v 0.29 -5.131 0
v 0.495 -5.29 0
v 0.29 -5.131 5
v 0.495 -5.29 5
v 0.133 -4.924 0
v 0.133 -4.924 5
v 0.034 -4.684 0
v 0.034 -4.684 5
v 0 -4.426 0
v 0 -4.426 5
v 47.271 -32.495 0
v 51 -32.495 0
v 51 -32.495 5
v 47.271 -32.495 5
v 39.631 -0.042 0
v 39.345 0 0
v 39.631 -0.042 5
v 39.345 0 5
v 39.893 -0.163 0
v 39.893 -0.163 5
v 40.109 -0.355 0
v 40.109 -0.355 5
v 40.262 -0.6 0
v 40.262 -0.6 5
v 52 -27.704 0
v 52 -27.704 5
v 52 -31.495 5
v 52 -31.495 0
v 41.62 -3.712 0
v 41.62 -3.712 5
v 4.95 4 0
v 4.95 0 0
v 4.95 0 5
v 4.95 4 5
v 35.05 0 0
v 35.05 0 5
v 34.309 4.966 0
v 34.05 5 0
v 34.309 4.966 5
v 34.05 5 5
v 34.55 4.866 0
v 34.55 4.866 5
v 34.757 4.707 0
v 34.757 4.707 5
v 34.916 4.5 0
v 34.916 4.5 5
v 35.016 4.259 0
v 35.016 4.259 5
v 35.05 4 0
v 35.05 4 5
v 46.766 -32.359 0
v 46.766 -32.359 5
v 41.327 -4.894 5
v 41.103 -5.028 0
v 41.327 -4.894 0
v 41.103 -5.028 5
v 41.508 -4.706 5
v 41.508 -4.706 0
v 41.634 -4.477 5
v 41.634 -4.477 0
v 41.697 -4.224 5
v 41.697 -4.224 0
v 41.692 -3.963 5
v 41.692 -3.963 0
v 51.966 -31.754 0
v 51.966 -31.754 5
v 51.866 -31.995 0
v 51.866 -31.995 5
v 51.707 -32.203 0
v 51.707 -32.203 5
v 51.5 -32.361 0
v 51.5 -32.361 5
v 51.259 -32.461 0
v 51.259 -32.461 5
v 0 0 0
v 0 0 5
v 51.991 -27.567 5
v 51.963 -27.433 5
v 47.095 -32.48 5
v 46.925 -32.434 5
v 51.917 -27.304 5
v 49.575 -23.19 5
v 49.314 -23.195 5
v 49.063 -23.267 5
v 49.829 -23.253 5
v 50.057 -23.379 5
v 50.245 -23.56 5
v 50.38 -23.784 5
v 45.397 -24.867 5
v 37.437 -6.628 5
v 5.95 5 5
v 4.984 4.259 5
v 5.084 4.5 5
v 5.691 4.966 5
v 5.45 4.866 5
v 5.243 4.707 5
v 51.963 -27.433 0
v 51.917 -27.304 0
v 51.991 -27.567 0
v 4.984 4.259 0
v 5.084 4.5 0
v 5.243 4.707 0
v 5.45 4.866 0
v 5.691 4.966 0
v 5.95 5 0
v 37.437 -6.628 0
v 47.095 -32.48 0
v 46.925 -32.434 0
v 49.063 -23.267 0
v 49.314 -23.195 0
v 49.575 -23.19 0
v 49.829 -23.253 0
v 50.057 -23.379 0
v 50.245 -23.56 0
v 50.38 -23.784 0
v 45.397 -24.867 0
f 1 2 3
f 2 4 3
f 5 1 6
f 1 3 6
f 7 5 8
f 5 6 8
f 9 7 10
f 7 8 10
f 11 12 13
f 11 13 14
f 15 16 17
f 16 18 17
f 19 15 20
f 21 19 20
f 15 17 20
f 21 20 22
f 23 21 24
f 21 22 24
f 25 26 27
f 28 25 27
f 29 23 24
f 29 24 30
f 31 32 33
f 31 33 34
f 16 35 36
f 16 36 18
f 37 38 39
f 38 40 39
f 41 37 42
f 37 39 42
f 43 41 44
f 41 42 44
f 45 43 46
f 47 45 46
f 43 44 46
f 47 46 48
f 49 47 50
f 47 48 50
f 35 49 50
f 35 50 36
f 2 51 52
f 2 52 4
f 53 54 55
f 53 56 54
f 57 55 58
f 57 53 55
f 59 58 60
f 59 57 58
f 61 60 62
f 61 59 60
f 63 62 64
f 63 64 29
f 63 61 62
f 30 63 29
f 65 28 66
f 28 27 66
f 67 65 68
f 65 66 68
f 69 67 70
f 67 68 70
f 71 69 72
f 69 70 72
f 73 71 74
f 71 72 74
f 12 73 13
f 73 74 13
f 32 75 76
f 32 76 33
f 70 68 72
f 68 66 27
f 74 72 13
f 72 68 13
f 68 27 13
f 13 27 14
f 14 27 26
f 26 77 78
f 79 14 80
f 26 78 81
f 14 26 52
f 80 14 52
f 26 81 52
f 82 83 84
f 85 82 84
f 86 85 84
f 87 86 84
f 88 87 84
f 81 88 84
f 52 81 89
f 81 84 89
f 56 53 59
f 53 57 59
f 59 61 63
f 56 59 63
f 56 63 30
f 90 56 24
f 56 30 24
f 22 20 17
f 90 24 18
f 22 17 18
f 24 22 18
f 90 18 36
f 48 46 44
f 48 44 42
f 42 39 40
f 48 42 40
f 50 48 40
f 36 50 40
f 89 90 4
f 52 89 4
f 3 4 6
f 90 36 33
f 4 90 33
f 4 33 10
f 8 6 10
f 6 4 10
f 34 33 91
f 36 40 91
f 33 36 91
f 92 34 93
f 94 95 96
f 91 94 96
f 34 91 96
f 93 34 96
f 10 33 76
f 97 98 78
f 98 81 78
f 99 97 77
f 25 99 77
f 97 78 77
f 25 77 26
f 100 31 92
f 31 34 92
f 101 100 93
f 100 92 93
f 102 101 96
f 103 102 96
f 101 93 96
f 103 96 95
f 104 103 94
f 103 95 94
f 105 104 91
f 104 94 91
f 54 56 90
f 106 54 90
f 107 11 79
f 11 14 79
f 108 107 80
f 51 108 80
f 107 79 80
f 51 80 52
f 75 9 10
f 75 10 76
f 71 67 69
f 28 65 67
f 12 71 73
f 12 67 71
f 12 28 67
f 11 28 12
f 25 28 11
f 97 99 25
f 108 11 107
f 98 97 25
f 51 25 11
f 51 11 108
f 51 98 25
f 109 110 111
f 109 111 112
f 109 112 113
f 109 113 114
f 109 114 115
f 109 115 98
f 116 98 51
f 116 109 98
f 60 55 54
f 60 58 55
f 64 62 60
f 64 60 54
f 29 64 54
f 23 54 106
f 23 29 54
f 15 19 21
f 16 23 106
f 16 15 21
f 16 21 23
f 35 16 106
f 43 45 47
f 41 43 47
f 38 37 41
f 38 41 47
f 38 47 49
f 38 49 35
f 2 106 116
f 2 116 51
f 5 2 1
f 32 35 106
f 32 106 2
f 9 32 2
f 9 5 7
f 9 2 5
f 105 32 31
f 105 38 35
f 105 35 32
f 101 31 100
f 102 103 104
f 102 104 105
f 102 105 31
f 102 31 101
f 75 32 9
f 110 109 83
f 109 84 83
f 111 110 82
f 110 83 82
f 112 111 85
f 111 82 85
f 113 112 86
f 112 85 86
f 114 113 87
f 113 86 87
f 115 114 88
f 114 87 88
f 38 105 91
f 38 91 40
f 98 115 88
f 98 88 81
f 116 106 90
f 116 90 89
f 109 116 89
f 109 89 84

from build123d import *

# Parameters (mm, degrees)
BOSS_EXTRUDE1_DEPTH = 5
FILLET1_R           = 1


with BuildPart() as part:
    # Sketch1 → Boss-Extrude1 (new body)
    with BuildSketch(Plane.XY):
        Polygon((42.02, -4.628401452), (37.437424305, -6.628401452), (45.397424305, -24.867052718), (49.98, -22.867052718), (52, -27.49545417), (52, -32.49545417), (47, -32.49545417), (0, -5), (0, 0), (4.95, 0), (4.95, 5), (35.05, 5), (35.05, 0), (40, 0), align=None)
    extrude(amount=BOSS_EXTRUDE1_DEPTH)

    # Fillet1
    fillet1_edges = [part.edges().sort_by_distance(p)[0] for p in [
        (4.95, 5, 2.5),
        (35.05, 5, 2.5),
        (40, 0, 2.5),
        (42.02, -4.628401452, 2.5),
        (49.98, -22.867052718, 2.5),
        (52, -27.49545417, 2.5),
        (52, -32.49545417, 2.5),
        (47, -32.49545417, 2.5),
        (0, -5, 2.5),
    ]]
    fillet(fillet1_edges, radius=FILLET1_R)


solid = part.part
